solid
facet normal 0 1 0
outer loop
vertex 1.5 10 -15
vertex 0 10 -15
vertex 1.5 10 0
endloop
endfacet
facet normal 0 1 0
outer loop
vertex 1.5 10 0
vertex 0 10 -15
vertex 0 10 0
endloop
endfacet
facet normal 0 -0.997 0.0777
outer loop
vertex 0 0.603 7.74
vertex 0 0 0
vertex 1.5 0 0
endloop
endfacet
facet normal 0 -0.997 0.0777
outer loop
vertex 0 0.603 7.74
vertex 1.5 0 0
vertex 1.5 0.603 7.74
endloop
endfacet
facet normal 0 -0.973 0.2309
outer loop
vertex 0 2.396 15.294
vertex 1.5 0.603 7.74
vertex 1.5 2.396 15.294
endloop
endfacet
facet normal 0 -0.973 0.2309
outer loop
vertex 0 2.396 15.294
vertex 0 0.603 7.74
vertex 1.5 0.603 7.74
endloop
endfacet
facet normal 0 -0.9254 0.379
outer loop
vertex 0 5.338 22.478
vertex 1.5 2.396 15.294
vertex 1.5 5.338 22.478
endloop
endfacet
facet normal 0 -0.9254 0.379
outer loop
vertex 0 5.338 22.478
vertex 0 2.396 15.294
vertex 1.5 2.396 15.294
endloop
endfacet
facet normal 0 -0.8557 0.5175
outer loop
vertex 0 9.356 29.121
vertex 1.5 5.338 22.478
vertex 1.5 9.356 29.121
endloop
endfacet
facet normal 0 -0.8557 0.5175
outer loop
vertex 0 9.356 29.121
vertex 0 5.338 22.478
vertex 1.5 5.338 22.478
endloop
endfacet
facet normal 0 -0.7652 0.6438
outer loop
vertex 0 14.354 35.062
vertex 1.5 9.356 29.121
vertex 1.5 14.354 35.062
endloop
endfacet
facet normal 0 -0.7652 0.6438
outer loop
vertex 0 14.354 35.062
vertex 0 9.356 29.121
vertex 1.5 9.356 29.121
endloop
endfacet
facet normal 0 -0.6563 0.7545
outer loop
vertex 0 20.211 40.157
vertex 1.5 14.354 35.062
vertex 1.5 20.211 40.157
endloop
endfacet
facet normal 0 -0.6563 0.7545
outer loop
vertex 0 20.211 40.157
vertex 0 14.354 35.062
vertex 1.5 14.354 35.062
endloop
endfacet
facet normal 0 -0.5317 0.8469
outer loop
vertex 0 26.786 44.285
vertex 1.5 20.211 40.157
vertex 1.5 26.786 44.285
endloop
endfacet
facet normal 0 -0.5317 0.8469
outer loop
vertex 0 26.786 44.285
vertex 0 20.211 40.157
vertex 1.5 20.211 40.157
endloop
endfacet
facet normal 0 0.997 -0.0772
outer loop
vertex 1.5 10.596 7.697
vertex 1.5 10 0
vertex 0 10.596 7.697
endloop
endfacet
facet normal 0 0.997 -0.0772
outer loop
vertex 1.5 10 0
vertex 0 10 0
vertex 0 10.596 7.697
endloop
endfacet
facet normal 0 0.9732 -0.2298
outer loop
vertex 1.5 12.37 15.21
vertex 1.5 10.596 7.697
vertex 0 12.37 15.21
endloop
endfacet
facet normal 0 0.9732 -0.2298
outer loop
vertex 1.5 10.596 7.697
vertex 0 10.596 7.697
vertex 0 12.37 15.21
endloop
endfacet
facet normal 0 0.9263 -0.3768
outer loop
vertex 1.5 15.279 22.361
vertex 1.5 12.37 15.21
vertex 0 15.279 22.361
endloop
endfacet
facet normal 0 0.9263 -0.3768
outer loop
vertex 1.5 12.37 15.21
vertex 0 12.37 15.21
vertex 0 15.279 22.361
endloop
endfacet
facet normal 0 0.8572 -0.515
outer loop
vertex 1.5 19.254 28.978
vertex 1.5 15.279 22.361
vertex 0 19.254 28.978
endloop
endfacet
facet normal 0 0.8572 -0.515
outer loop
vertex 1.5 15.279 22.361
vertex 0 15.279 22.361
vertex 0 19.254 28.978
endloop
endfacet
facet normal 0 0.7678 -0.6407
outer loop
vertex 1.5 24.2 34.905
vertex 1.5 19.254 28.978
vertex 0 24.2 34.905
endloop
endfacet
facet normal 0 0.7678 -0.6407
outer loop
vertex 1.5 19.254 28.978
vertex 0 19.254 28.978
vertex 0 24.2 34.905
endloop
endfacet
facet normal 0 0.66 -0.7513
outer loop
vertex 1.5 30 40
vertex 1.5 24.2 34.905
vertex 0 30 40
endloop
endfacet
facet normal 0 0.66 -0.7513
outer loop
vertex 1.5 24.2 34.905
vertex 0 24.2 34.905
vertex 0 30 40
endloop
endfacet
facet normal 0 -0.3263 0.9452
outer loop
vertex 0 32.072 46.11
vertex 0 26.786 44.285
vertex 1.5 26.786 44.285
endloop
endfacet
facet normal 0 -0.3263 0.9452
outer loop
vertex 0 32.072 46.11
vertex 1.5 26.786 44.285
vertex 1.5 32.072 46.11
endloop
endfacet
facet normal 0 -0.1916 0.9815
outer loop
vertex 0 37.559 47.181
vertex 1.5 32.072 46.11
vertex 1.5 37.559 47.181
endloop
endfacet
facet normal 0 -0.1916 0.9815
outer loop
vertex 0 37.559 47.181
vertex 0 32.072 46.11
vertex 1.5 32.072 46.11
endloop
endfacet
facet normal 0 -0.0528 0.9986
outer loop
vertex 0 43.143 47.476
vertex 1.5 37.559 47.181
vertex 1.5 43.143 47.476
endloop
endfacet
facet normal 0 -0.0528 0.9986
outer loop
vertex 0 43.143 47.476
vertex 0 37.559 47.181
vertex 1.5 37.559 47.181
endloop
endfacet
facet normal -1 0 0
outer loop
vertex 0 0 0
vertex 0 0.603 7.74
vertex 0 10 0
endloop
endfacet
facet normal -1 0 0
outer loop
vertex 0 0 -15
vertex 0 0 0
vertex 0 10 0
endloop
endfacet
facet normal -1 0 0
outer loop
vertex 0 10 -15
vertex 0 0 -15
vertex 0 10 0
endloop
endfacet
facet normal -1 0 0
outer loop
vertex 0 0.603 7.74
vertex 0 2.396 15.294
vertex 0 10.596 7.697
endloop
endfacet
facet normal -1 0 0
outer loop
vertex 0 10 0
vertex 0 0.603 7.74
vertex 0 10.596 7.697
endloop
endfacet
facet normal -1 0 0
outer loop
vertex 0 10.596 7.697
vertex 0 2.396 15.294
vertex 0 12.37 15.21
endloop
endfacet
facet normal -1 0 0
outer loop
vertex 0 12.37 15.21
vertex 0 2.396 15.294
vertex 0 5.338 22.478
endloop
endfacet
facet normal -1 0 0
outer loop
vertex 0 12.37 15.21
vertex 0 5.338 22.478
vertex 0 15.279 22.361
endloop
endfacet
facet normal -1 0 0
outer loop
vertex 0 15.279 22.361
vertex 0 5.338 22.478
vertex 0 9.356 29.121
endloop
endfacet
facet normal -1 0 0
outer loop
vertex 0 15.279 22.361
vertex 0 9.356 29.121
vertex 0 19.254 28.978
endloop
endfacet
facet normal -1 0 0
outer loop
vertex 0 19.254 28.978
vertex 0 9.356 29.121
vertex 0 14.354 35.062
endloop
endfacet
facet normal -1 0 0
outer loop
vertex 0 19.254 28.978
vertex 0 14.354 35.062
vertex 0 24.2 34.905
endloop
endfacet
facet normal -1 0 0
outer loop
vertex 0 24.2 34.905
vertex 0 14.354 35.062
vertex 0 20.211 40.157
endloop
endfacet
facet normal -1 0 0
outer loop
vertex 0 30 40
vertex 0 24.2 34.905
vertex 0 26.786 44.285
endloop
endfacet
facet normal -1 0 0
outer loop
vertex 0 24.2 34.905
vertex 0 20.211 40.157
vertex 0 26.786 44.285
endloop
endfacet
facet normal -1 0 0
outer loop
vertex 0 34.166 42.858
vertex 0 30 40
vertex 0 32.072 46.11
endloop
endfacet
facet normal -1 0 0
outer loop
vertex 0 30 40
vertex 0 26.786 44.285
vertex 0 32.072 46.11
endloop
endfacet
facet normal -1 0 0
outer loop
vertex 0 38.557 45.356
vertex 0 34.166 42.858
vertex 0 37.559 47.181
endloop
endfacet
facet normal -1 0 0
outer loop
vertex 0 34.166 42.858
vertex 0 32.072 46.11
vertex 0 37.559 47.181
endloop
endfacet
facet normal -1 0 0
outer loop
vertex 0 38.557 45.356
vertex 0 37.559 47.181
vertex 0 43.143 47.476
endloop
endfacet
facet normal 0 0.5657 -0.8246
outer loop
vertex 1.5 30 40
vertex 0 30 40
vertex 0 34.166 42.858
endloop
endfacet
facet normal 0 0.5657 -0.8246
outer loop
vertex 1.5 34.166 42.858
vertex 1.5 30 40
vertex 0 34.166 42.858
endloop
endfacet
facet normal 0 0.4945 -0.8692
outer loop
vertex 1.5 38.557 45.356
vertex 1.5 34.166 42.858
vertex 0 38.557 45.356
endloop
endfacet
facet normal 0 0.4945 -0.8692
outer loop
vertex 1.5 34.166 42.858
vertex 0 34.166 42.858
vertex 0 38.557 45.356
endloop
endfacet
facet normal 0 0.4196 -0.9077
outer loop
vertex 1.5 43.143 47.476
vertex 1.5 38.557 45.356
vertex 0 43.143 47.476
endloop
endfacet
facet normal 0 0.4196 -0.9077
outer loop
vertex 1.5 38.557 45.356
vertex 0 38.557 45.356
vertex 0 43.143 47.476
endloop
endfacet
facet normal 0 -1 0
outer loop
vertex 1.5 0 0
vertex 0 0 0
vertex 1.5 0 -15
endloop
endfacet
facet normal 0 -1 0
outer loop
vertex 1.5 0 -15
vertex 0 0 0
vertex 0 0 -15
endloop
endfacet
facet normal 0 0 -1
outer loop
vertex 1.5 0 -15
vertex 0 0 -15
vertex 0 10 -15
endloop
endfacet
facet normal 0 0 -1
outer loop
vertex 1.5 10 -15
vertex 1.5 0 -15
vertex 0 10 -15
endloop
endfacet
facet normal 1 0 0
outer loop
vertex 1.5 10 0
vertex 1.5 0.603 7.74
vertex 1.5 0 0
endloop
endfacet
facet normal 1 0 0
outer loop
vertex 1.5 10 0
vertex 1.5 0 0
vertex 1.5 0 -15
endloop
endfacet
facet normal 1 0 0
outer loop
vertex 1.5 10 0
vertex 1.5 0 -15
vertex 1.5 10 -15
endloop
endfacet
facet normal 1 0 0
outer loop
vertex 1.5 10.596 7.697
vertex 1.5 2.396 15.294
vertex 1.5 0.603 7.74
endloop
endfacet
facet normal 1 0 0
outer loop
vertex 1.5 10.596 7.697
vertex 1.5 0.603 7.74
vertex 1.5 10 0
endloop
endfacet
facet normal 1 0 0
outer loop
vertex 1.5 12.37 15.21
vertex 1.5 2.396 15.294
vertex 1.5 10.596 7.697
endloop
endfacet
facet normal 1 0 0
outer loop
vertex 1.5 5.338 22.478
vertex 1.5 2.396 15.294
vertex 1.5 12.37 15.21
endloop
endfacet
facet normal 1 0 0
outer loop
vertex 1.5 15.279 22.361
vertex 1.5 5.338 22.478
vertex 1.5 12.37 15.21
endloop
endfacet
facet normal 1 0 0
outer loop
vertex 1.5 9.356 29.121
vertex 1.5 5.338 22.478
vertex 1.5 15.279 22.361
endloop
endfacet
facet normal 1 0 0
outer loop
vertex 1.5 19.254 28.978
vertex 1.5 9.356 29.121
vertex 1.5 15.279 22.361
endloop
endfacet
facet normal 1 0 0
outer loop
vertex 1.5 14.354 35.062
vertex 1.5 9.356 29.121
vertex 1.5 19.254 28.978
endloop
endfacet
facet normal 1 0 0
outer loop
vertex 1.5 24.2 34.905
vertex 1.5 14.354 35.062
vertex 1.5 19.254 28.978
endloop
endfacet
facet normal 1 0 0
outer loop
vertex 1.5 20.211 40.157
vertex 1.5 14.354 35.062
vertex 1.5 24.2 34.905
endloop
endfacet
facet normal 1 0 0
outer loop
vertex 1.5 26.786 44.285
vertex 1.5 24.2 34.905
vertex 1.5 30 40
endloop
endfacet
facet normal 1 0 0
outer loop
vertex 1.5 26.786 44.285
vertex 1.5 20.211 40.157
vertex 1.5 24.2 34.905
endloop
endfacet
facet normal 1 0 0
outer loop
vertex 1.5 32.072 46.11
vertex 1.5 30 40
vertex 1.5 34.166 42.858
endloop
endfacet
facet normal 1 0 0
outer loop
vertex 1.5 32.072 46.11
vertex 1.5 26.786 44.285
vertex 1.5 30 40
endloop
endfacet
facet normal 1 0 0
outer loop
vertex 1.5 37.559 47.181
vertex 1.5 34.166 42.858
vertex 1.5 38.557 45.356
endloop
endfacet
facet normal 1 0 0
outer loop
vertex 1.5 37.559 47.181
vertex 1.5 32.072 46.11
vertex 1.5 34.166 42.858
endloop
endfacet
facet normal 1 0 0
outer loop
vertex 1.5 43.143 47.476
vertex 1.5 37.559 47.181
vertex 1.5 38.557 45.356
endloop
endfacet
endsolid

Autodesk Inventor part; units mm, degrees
ref_plane "YZ Plane" through (0, 0, 0) normal (1, 0, 0) x (0, 1, 0)
ref_plane "XZ Plane" through (0, 0, 0) normal (0, 1, 0) x (-1, 0, 0)
ref_plane "XY Plane" through (0, 0, 0) normal (0, 0, 1) x (1, 0, 0)
sketch "スケッチ1" plane through (0, 0, 0) normal (1, 0, 0) x (0, 1, 0)
  line L0 (10, 0) -> (0, 0)
  line L1 (0, 0) -> (0, -15)
  line L2 (0, -15) -> (10, -15)
  line L3 (10, -15) -> (10, 0)
  arc A0 (30, 40) -> (10, 0) centre (60, 0) ccw
  arc A1 (26.7865, 44.2847) -> (0, 0) centre (50, 0) ccw
  line L4 (30, 40) -> (26.7865, 44.2847)
  line L5 (60, 0) -> (30, 40) construction
  arc A2 (43.1431, 47.4758) -> (30, 40) centre (66, -8) ccw
  arc A3 (43.1431, 47.4758) -> (26.7865, 44.2847) centre (42.4562, 7.4817) ccw
  dimension "d0" = 10
  dimension "d1" = 15
  dimension "d2" = 50
  dimension "d3" = 50
  dimension "d5" = 40
  dimension "d6" = 15
  dimension "d7" = 40
  dimension "d10" = 60
extrude "押し出し1" add sketch "スケッチ1" along normal blind 1.5
equation "\"d3\" = d2"
properties part number "claw"
